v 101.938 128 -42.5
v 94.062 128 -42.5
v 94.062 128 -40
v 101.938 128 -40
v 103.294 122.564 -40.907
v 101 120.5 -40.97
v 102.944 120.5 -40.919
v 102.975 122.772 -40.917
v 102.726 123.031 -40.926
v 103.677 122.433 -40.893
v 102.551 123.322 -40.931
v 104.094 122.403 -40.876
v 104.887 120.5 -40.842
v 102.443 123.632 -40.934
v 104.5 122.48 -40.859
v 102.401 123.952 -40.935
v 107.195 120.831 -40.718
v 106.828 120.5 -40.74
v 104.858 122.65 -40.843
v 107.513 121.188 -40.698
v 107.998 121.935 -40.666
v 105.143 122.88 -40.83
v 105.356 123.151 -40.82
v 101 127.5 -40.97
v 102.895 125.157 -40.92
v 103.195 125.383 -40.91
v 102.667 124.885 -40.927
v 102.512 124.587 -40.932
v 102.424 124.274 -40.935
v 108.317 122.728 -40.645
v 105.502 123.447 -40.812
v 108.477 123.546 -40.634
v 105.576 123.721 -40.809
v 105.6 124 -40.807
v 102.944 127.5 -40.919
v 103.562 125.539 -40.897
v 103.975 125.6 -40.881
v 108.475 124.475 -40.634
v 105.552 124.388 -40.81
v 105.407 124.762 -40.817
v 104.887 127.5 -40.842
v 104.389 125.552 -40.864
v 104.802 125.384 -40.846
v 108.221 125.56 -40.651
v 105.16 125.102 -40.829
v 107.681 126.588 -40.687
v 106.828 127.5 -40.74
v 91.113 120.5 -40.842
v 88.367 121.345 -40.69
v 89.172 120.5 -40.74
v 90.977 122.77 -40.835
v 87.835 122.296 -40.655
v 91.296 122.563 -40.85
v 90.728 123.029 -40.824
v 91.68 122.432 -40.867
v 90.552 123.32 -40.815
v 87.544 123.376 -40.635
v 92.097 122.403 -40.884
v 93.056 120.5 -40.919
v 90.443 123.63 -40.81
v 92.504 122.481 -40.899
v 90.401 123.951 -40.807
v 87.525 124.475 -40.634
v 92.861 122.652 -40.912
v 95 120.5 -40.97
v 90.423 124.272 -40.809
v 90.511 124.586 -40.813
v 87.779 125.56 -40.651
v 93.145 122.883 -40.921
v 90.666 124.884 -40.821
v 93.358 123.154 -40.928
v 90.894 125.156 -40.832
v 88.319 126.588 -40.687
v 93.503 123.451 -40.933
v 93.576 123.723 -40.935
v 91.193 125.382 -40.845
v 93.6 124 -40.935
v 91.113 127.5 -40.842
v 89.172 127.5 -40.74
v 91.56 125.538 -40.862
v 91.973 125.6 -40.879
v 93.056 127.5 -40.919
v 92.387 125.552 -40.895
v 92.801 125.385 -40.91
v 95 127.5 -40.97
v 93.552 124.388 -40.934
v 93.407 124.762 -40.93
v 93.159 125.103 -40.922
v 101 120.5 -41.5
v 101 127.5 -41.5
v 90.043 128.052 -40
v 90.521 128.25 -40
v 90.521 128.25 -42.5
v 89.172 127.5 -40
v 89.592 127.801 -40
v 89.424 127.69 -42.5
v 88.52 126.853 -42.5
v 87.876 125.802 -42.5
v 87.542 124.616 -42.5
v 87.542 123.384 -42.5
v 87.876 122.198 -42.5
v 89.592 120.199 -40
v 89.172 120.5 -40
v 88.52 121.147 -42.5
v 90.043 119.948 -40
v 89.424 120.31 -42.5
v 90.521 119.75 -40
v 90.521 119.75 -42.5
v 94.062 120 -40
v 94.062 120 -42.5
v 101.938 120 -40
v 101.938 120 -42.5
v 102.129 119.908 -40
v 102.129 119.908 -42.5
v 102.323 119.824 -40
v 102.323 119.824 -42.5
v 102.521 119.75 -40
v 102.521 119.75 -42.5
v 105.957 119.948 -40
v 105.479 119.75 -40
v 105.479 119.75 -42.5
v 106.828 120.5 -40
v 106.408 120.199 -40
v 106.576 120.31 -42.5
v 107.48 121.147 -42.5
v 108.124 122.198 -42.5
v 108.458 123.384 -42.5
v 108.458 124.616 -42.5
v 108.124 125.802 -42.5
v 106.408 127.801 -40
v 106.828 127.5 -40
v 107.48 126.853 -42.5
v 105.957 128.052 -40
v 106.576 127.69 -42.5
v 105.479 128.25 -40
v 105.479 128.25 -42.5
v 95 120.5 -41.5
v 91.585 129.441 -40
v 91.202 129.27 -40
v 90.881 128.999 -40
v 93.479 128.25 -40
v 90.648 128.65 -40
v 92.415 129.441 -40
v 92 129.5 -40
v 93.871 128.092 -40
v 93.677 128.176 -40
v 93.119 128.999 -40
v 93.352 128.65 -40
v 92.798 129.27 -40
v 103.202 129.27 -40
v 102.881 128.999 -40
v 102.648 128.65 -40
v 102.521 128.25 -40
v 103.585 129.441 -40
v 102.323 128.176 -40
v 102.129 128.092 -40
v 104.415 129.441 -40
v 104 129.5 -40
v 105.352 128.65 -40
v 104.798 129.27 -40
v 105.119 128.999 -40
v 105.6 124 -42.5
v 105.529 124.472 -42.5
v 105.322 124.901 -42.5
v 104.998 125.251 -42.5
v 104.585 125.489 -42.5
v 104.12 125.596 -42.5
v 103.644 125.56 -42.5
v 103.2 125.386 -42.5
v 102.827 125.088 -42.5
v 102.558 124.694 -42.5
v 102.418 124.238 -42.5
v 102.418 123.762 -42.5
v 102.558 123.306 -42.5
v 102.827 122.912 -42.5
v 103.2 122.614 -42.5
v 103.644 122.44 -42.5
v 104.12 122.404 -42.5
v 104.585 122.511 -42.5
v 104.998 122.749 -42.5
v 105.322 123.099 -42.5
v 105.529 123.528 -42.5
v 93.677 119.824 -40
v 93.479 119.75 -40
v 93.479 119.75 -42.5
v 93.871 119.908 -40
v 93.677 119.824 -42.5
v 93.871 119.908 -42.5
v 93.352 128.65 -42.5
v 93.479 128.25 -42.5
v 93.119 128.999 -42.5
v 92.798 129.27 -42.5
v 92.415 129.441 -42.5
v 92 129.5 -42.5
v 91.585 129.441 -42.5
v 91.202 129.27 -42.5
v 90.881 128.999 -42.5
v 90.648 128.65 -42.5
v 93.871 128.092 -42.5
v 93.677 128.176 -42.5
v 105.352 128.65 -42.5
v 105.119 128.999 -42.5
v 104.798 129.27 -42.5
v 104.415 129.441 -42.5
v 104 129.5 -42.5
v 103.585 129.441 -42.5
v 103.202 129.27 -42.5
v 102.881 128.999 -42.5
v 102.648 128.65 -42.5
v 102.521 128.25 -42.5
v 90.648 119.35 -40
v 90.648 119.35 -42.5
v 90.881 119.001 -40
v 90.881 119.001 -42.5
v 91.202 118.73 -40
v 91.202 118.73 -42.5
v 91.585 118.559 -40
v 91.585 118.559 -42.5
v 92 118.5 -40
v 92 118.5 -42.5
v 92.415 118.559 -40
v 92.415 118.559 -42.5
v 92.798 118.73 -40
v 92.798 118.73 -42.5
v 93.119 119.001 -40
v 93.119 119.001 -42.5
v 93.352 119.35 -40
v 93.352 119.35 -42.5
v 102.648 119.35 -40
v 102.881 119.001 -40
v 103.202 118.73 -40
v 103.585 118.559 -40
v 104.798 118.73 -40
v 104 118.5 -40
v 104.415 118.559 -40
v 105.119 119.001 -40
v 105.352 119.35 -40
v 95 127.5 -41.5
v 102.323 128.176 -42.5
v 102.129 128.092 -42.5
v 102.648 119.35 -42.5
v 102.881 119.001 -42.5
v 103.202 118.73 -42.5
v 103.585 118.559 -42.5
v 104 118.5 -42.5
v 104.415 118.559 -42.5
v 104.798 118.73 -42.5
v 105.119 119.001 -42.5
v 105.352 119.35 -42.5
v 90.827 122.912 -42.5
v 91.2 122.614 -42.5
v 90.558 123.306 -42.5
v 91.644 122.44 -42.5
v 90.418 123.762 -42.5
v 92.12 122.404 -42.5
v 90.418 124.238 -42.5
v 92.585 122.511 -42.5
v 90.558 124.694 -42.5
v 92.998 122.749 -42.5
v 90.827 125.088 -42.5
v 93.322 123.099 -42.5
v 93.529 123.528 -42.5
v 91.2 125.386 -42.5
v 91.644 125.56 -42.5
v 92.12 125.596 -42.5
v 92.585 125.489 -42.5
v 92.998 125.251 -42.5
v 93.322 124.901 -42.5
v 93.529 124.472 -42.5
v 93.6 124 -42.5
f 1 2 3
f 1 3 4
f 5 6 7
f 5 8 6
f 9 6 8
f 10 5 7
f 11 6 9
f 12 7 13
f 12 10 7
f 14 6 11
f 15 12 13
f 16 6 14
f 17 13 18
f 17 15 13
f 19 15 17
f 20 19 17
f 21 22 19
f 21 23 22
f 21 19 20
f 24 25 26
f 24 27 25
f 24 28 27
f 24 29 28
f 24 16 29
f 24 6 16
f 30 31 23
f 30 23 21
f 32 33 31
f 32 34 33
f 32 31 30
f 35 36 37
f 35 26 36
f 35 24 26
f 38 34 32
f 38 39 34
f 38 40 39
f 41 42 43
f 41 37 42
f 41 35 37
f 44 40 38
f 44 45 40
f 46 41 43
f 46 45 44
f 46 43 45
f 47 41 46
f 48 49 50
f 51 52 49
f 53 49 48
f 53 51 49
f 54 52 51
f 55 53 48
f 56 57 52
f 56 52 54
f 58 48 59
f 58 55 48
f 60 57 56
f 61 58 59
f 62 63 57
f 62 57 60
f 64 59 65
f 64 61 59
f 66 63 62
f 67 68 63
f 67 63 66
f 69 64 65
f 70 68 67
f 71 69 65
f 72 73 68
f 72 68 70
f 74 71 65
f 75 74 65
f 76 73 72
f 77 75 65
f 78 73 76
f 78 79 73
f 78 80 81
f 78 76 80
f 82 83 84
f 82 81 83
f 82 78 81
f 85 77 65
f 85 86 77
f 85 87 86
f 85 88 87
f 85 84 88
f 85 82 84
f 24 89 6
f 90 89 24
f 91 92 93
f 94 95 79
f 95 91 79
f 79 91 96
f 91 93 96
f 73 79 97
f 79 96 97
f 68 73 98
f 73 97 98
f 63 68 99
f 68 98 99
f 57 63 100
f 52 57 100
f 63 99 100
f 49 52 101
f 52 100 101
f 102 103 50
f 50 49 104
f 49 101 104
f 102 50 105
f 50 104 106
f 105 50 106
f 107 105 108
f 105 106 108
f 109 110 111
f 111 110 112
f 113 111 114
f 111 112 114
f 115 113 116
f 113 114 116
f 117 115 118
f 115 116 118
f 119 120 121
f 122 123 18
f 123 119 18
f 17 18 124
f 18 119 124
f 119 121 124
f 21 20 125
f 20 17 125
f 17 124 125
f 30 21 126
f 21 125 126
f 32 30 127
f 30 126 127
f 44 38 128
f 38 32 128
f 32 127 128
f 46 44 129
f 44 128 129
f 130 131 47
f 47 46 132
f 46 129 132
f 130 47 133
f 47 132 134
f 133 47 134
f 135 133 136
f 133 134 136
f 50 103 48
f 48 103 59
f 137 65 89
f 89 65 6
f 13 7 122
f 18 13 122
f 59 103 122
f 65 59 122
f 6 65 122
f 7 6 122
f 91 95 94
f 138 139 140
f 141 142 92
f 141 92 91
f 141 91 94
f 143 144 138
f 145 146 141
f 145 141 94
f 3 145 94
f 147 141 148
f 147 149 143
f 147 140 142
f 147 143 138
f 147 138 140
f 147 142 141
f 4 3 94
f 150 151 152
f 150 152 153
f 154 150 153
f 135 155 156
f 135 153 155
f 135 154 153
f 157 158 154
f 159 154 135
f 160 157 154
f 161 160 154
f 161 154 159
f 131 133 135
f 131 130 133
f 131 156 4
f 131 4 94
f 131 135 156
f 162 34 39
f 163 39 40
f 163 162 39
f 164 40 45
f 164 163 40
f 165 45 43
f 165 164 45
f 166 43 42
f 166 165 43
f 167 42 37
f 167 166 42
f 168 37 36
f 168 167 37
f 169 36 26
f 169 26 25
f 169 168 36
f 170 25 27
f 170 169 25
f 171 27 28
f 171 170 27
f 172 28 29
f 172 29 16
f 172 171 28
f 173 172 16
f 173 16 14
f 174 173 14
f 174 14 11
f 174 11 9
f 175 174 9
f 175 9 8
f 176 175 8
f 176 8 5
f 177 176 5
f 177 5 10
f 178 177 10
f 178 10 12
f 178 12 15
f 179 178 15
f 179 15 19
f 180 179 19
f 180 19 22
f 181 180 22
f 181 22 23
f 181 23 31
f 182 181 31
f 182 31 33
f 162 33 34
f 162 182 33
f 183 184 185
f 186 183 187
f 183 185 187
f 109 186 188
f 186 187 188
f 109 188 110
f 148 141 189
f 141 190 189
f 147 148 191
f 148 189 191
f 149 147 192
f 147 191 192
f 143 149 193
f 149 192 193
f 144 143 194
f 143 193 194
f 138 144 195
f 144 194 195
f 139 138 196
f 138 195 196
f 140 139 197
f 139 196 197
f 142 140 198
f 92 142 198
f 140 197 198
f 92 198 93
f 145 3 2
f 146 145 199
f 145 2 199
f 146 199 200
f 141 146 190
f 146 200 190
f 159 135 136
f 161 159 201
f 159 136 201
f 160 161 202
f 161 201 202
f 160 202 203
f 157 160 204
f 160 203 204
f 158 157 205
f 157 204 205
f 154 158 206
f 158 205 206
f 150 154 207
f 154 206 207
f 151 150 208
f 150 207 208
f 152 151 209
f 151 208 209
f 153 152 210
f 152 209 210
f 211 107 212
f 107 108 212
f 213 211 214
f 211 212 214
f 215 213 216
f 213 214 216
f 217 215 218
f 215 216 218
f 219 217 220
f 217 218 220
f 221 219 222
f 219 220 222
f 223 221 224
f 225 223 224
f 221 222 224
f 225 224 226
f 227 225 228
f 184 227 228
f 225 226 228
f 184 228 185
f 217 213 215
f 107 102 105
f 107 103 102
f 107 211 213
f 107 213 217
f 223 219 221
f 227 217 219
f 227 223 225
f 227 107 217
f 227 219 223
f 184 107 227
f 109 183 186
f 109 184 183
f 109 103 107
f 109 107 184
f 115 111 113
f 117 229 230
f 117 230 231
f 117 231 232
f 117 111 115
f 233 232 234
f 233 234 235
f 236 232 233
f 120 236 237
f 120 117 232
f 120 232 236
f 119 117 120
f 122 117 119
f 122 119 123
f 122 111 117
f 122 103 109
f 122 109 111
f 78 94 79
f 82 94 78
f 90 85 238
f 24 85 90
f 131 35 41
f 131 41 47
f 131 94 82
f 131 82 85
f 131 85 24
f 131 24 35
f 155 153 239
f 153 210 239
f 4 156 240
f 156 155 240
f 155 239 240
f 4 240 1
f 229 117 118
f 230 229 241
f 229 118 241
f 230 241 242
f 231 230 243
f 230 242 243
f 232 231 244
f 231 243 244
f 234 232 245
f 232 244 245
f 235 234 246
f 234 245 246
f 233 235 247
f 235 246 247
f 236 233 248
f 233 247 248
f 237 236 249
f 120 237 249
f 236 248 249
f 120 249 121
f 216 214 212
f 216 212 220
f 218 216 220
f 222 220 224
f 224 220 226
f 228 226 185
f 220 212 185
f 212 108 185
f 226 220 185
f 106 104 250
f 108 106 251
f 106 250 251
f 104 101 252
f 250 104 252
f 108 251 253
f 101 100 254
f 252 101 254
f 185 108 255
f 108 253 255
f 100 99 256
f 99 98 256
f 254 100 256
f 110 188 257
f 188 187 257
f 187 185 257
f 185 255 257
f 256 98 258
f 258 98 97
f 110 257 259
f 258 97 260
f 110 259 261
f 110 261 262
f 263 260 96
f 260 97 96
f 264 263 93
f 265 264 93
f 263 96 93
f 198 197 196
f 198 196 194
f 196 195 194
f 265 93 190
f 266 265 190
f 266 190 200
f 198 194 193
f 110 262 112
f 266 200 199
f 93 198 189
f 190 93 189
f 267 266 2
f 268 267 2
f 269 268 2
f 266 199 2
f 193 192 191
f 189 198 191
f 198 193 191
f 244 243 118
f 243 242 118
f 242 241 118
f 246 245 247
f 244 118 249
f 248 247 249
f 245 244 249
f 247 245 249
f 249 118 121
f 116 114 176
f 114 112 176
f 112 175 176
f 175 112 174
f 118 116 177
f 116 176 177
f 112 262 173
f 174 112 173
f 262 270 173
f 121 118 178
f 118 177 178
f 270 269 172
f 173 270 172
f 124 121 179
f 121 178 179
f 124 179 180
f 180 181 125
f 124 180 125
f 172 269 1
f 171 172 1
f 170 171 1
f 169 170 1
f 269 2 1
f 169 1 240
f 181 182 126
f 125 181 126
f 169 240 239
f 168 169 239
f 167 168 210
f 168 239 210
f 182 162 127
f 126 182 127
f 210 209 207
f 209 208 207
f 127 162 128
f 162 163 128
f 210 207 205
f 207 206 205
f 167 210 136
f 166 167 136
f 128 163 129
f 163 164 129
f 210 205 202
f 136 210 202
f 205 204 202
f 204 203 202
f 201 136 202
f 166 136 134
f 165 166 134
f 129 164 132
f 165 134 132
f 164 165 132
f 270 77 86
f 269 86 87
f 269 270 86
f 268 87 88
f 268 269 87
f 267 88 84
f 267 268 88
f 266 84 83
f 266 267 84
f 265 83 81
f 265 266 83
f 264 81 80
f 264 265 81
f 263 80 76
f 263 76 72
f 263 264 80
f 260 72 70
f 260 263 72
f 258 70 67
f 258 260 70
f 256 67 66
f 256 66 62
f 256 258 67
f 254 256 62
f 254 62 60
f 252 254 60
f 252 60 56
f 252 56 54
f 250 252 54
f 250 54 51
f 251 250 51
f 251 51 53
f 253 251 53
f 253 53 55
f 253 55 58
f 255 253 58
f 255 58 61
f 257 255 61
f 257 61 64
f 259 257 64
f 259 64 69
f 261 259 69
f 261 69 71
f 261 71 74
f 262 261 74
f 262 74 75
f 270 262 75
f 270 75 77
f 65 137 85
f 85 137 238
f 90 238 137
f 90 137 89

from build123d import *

# Parameters (mm, degrees)
BOX469_W               = 8
BOX469_H               = 8
BOX469_DEPTH           = 1
BOX468_W               = 26
BOX468_H               = 13
BOX468_DEPTH           = 1.5
BOX467_W               = 6
BOX467_H               = 7
BOX467_DEPTH           = 3
CYLINDER691_R          = 150
CYLINDER691_DEPTH      = 7
CYLINDER691_ROLL_ANGLE = 90
CYLINDER689_R          = 1.6
CYLINDER689_DEPTH      = 10
CYLINDER690_R          = 1.6
CYLINDER690_DEPTH      = 10
BOX466_W               = 10
BOX466_H               = 10
BOX466_DEPTH           = 10
CYLINDER688_R          = 1.5
CYLINDER688_DEPTH      = 4
CUT576_PLACEMENT_ANGLE = 180
BOX465_W               = 10
BOX465_H               = 10
BOX465_DEPTH           = 10
CYLINDER687_R          = 1.5
CYLINDER687_DEPTH      = 4
CUT575_PLACEMENT_ANGLE = 180
BOX464_W               = 10
BOX464_H               = 10
BOX464_DEPTH           = 10
CYLINDER686_R          = 1.5
CYLINDER686_DEPTH      = 4
BOX463_W               = 10
BOX463_H               = 10
BOX463_DEPTH           = 10
CYLINDER685_R          = 1.5
CYLINDER685_DEPTH      = 4
BOX461_W               = 12
BOX461_H               = 0.5
BOX461_DEPTH           = 1
BOX462_W               = 12
BOX462_H               = 0.5
BOX462_DEPTH           = 1
BOX460_W               = 12
BOX460_H               = 1
BOX460_DEPTH           = 4
BOX459_W               = 12
BOX459_H               = 1
BOX459_DEPTH           = 4
CYLINDER684_R          = 4.5
CYLINDER684_DEPTH      = 4
CYLINDER683_R          = 4.5
CYLINDER683_DEPTH      = 4
BOX458_W               = 12
BOX458_H               = 8
BOX458_DEPTH           = 1


with BuildPart() as box469:
    # Box469 → Box469 (new body)
    with BuildSketch(Plane(origin=(2, -4, 0), x_dir=(1, 0, 0), z_dir=(0, 0, 1))):
        with Locations((4, 4)):
            Rectangle(BOX469_W, BOX469_H)
    extrude(amount=BOX469_DEPTH)


with BuildPart() as box468:
    # Box468 → Box468 (new body)
    with BuildSketch(Plane(origin=(-6, -6, 0), x_dir=(1, 0, 0), z_dir=(0, 0, 1))):
        with Locations((13, 6.5)):
            Rectangle(BOX468_W, BOX468_H)
    extrude(amount=BOX468_DEPTH)


with BuildPart() as box467:
    # Box467 → Box467 (new body)
    with BuildSketch(Plane(origin=(3, -3.5, 1), x_dir=(1, 0, 0), z_dir=(0, 0, 1))):
        with Locations((3, 3.5)):
            Rectangle(BOX467_W, BOX467_H)
    extrude(amount=BOX467_DEPTH)


with BuildPart() as cylinder910:
    # Cylinder691 → Cylinder691 (new body)
    with BuildSketch(Plane.XY):
        Circle(CYLINDER691_R)
    extrude(amount=CYLINDER691_DEPTH)


with BuildPart() as cylinder910_1:
    # Cylinder691 roll: moved
    add(cylinder910.part.rotate(Axis((0, 0, 0), (1, 0, 0)), CYLINDER691_ROLL_ANGLE))


with BuildPart() as cylinder910_2:
    # Cylinder691 placement: moved
    add(cylinder910_1.part.moved(Location((6, 3.5, 153))))


with BuildPart() as cylinder908:
    # Cylinder689 → Cylinder689 (new body)
    with BuildSketch(Plane.XY):
        Circle(CYLINDER689_R)
    extrude(amount=CYLINDER689_DEPTH)


with BuildPart() as fusion458:
    # Cylinder690 → Cylinder690 (new body)
    with BuildSketch(Plane(origin=(12, 0, 0), x_dir=(1, 0, 0), z_dir=(0, 0, 1))):
        Circle(CYLINDER690_R)
    extrude(amount=CYLINDER690_DEPTH)

    # Fusion458: union Cylinder908
    add(cylinder908.part)


with BuildPart() as box466:
    # Box466 → Box466 (new body)
    with BuildSketch(Plane(origin=(-5, 0, 0), x_dir=(1, 0, 0), z_dir=(0, 0, 1))):
        with Locations((5, 5)):
            Rectangle(BOX466_W, BOX466_H)
    extrude(amount=BOX466_DEPTH)


with BuildPart() as cut864:
    # Cylinder688 → Cylinder688 (new body)
    with BuildSketch(Plane.XY):
        Circle(CYLINDER688_R)
    extrude(amount=CYLINDER688_DEPTH)

    # Cut576: cut Box466
    add(box466.part, mode=Mode.SUBTRACT)


with BuildPart() as cut864_1:
    # Cut576 placement: moved
    add(cut864.part.moved(Location((12, 4, 0))).rotate(Axis((12, 4, 0), (0, 0, 1)), CUT576_PLACEMENT_ANGLE))


with BuildPart() as box465:
    # Box465 → Box465 (new body)
    with BuildSketch(Plane(origin=(-5, 0, 0), x_dir=(1, 0, 0), z_dir=(0, 0, 1))):
        with Locations((5, 5)):
            Rectangle(BOX465_W, BOX465_H)
    extrude(amount=BOX465_DEPTH)


with BuildPart() as cut863:
    # Cylinder687 → Cylinder687 (new body)
    with BuildSketch(Plane.XY):
        Circle(CYLINDER687_R)
    extrude(amount=CYLINDER687_DEPTH)

    # Cut575: cut Box465
    add(box465.part, mode=Mode.SUBTRACT)


with BuildPart() as cut863_1:
    # Cut575 placement: moved
    add(cut863.part.moved(Location((0, 4, 0))).rotate(Axis((0, 4, 0), (0, 0, 1)), CUT575_PLACEMENT_ANGLE))


with BuildPart() as box464:
    # Box464 → Box464 (new body)
    with BuildSketch(Plane(origin=(-5, 0, 0), x_dir=(1, 0, 0), z_dir=(0, 0, 1))):
        with Locations((5, 5)):
            Rectangle(BOX464_W, BOX464_H)
    extrude(amount=BOX464_DEPTH)


with BuildPart() as cut862:
    # Cylinder686 → Cylinder686 (new body)
    with BuildSketch(Plane.XY):
        Circle(CYLINDER686_R)
    extrude(amount=CYLINDER686_DEPTH)

    # Cut574: cut Box464
    add(box464.part, mode=Mode.SUBTRACT)


with BuildPart() as cut862_1:
    # Cut574 placement: moved
    add(cut862.part.moved(Location((12, -4, 0))))


with BuildPart() as box463:
    # Box463 → Box463 (new body)
    with BuildSketch(Plane(origin=(-5, 0, 0), x_dir=(1, 0, 0), z_dir=(0, 0, 1))):
        with Locations((5, 5)):
            Rectangle(BOX463_W, BOX463_H)
    extrude(amount=BOX463_DEPTH)


with BuildPart() as cut861:
    # Cylinder685 → Cylinder685 (new body)
    with BuildSketch(Plane.XY):
        Circle(CYLINDER685_R)
    extrude(amount=CYLINDER685_DEPTH)

    # Cut573: cut Box463
    add(box463.part, mode=Mode.SUBTRACT)


with BuildPart() as cut861_1:
    # Cut573 placement: moved
    add(cut861.part.moved(Location((0, -4, 0))))


with BuildPart() as box461:
    # Box461 → Box461 (new body)
    with BuildSketch(Plane(origin=(0, 3.5, 3), x_dir=(1, 0, 0), z_dir=(0, 0, 1))):
        with Locations((6, 0.25)):
            Rectangle(BOX461_W, BOX461_H)
    extrude(amount=BOX461_DEPTH)


with BuildPart() as box462:
    # Box462 → Box462 (new body)
    with BuildSketch(Plane(origin=(0, -4, 3), x_dir=(1, 0, 0), z_dir=(0, 0, 1))):
        with Locations((6, 0.25)):
            Rectangle(BOX462_W, BOX462_H)
    extrude(amount=BOX462_DEPTH)


with BuildPart() as box460:
    # Box460 → Box460 (new body)
    with BuildSketch(Plane(origin=(0, 3, 0), x_dir=(1, 0, 0), z_dir=(0, 0, 1))):
        with Locations((6, 0.5)):
            Rectangle(BOX460_W, BOX460_H)
    extrude(amount=BOX460_DEPTH)


with BuildPart() as box459:
    # Box459 → Box459 (new body)
    with BuildSketch(Plane(origin=(0, -4, 0), x_dir=(1, 0, 0), z_dir=(0, 0, 1))):
        with Locations((6, 0.5)):
            Rectangle(BOX459_W, BOX459_H)
    extrude(amount=BOX459_DEPTH)


with BuildPart() as cylinder801:
    # Cylinder684 → Cylinder684 (new body)
    with BuildSketch(Plane(origin=(12, 0, 0), x_dir=(1, 0, 0), z_dir=(0, 0, 1))):
        Circle(CYLINDER684_R)
    extrude(amount=CYLINDER684_DEPTH)


with BuildPart() as cylinder800:
    # Cylinder683 → Cylinder683 (new body)
    with BuildSketch(Plane.XY):
        Circle(CYLINDER683_R)
    extrude(amount=CYLINDER683_DEPTH)


with BuildPart() as leafspring_spacer_front_right:
    # Box458 → Box458 (new body)
    with BuildSketch(Plane(origin=(0, -4, 0), x_dir=(1, 0, 0), z_dir=(0, 0, 1))):
        with Locations((6, 4)):
            Rectangle(BOX458_W, BOX458_H)
    extrude(amount=BOX458_DEPTH)

    # Fusion454: union Cylinder801, Cylinder800
    add(cylinder801.part)
    add(cylinder800.part)

    # Fusion455: union Box460, Box459
    add(box460.part)
    add(box459.part)

    # Fusion456: union Box461, Box462
    add(box461.part)
    add(box462.part)

    # Fusion457: union Cut864, Cut863, Cut862, Cut861
    add(cut864_1.part)
    add(cut863_1.part)
    add(cut862_1.part)
    add(cut861_1.part)

    # Cut577: cut Fusion458
    add(fusion458.part, mode=Mode.SUBTRACT)

    # Cut578: cut Cylinder910
    add(cylinder910_2.part, mode=Mode.SUBTRACT)

    # Cut579: cut Box467
    add(box467.part, mode=Mode.SUBTRACT)

    # Cut580: cut Box468
    add(box468.part, mode=Mode.SUBTRACT)


with BuildPart() as leafspring_spacer_front_right_1:
    # Cut580 placement: moved
    add(leafspring_spacer_front_right.part.moved(Location((0, 0, -1.5))))

    # Fusion459: union Box469
    add(box469.part)


with BuildPart() as leafspring_spacer_front_right_2:
    # Fusion459 placement: moved
    add(leafspring_spacer_front_right_1.part.moved(Location((92, 124, -42.5))))


solid = leafspring_spacer_front_right_2.part
